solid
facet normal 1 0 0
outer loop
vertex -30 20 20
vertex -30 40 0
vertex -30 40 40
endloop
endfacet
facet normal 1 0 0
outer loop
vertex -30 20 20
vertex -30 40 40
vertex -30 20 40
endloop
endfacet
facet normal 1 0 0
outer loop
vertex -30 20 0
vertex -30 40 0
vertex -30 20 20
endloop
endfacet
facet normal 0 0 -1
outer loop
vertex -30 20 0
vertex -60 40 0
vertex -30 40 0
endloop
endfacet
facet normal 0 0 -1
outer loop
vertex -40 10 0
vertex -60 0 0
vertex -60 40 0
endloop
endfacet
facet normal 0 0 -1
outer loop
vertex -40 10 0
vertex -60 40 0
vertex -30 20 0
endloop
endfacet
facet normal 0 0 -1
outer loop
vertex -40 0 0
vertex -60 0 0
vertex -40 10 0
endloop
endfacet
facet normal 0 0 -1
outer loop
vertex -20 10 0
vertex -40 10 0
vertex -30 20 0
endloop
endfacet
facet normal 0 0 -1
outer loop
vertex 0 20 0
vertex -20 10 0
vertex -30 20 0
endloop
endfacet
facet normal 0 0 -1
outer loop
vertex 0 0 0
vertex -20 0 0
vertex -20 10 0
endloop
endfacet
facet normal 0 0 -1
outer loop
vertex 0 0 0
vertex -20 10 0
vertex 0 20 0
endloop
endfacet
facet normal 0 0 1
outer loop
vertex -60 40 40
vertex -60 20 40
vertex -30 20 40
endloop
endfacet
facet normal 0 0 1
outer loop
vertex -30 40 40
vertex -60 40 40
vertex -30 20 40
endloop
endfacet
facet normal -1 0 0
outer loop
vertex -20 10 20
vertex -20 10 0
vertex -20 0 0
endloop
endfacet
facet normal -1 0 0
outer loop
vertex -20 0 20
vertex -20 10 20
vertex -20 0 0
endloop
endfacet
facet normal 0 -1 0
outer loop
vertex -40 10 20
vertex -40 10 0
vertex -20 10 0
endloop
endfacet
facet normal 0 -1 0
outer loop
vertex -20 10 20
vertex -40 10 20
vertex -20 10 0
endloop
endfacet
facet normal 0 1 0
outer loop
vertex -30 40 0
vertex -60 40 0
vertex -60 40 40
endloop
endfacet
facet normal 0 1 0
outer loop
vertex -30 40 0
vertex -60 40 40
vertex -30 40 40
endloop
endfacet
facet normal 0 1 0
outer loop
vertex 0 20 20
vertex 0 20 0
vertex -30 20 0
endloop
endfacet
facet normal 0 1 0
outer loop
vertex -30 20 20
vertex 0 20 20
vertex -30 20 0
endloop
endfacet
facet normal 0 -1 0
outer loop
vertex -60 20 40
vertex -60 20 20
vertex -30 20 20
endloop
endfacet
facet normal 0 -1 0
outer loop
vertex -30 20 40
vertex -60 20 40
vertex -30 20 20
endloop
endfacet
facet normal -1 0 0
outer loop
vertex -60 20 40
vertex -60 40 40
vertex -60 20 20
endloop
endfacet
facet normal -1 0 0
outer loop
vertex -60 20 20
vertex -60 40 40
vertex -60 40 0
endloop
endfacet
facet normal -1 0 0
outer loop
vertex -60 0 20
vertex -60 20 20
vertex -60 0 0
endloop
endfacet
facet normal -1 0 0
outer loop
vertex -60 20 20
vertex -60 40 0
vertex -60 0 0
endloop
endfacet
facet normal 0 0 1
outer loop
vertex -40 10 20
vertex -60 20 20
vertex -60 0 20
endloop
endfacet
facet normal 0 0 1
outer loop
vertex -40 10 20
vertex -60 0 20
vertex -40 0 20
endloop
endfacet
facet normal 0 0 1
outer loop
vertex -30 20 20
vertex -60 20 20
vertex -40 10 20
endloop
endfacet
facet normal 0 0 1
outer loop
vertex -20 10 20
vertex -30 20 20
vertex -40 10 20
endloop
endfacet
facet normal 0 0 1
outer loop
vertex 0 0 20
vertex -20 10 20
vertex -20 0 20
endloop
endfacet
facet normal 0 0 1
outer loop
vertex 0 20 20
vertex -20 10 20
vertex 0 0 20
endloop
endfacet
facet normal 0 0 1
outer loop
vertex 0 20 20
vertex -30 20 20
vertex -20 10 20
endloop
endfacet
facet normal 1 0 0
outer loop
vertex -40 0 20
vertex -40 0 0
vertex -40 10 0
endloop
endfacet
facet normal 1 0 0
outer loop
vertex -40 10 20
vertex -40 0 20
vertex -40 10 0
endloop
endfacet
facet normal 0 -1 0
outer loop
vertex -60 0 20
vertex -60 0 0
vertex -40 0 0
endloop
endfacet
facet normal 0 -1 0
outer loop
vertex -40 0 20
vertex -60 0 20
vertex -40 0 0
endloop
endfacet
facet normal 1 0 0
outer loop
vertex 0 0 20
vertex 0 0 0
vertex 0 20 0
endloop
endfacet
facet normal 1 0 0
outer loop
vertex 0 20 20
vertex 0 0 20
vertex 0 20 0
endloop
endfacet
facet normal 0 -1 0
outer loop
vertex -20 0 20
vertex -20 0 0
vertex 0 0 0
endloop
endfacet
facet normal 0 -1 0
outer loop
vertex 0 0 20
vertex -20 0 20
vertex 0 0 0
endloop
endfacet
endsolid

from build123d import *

# Parameters (mm, degrees)
F1_DEPTH = 20
F2_W     = 30
F2_H     = 20
F3_DEPTH = 40


with BuildPart() as f1:
    # F0 (on Top) → F1 (new body)
    with BuildSketch(Plane.XY):
        Polygon((-20, 0), (0, 0), (0, 20), (-60, 20), (-60, 0), (-40, 0), (-40, 10), (-20, 10), align=None)
    extrude(amount=F1_DEPTH)

    # F2 (on face) → F3 (join)
    with BuildSketch(Plane(origin=(0, 0, 0), x_dir=(1, 0, 0), z_dir=(0, 0, -1))):
        with Locations((-45, -30)):
            Rectangle(F2_W, F2_H)
    extrude(amount=-F3_DEPTH)


solid = f1.part
